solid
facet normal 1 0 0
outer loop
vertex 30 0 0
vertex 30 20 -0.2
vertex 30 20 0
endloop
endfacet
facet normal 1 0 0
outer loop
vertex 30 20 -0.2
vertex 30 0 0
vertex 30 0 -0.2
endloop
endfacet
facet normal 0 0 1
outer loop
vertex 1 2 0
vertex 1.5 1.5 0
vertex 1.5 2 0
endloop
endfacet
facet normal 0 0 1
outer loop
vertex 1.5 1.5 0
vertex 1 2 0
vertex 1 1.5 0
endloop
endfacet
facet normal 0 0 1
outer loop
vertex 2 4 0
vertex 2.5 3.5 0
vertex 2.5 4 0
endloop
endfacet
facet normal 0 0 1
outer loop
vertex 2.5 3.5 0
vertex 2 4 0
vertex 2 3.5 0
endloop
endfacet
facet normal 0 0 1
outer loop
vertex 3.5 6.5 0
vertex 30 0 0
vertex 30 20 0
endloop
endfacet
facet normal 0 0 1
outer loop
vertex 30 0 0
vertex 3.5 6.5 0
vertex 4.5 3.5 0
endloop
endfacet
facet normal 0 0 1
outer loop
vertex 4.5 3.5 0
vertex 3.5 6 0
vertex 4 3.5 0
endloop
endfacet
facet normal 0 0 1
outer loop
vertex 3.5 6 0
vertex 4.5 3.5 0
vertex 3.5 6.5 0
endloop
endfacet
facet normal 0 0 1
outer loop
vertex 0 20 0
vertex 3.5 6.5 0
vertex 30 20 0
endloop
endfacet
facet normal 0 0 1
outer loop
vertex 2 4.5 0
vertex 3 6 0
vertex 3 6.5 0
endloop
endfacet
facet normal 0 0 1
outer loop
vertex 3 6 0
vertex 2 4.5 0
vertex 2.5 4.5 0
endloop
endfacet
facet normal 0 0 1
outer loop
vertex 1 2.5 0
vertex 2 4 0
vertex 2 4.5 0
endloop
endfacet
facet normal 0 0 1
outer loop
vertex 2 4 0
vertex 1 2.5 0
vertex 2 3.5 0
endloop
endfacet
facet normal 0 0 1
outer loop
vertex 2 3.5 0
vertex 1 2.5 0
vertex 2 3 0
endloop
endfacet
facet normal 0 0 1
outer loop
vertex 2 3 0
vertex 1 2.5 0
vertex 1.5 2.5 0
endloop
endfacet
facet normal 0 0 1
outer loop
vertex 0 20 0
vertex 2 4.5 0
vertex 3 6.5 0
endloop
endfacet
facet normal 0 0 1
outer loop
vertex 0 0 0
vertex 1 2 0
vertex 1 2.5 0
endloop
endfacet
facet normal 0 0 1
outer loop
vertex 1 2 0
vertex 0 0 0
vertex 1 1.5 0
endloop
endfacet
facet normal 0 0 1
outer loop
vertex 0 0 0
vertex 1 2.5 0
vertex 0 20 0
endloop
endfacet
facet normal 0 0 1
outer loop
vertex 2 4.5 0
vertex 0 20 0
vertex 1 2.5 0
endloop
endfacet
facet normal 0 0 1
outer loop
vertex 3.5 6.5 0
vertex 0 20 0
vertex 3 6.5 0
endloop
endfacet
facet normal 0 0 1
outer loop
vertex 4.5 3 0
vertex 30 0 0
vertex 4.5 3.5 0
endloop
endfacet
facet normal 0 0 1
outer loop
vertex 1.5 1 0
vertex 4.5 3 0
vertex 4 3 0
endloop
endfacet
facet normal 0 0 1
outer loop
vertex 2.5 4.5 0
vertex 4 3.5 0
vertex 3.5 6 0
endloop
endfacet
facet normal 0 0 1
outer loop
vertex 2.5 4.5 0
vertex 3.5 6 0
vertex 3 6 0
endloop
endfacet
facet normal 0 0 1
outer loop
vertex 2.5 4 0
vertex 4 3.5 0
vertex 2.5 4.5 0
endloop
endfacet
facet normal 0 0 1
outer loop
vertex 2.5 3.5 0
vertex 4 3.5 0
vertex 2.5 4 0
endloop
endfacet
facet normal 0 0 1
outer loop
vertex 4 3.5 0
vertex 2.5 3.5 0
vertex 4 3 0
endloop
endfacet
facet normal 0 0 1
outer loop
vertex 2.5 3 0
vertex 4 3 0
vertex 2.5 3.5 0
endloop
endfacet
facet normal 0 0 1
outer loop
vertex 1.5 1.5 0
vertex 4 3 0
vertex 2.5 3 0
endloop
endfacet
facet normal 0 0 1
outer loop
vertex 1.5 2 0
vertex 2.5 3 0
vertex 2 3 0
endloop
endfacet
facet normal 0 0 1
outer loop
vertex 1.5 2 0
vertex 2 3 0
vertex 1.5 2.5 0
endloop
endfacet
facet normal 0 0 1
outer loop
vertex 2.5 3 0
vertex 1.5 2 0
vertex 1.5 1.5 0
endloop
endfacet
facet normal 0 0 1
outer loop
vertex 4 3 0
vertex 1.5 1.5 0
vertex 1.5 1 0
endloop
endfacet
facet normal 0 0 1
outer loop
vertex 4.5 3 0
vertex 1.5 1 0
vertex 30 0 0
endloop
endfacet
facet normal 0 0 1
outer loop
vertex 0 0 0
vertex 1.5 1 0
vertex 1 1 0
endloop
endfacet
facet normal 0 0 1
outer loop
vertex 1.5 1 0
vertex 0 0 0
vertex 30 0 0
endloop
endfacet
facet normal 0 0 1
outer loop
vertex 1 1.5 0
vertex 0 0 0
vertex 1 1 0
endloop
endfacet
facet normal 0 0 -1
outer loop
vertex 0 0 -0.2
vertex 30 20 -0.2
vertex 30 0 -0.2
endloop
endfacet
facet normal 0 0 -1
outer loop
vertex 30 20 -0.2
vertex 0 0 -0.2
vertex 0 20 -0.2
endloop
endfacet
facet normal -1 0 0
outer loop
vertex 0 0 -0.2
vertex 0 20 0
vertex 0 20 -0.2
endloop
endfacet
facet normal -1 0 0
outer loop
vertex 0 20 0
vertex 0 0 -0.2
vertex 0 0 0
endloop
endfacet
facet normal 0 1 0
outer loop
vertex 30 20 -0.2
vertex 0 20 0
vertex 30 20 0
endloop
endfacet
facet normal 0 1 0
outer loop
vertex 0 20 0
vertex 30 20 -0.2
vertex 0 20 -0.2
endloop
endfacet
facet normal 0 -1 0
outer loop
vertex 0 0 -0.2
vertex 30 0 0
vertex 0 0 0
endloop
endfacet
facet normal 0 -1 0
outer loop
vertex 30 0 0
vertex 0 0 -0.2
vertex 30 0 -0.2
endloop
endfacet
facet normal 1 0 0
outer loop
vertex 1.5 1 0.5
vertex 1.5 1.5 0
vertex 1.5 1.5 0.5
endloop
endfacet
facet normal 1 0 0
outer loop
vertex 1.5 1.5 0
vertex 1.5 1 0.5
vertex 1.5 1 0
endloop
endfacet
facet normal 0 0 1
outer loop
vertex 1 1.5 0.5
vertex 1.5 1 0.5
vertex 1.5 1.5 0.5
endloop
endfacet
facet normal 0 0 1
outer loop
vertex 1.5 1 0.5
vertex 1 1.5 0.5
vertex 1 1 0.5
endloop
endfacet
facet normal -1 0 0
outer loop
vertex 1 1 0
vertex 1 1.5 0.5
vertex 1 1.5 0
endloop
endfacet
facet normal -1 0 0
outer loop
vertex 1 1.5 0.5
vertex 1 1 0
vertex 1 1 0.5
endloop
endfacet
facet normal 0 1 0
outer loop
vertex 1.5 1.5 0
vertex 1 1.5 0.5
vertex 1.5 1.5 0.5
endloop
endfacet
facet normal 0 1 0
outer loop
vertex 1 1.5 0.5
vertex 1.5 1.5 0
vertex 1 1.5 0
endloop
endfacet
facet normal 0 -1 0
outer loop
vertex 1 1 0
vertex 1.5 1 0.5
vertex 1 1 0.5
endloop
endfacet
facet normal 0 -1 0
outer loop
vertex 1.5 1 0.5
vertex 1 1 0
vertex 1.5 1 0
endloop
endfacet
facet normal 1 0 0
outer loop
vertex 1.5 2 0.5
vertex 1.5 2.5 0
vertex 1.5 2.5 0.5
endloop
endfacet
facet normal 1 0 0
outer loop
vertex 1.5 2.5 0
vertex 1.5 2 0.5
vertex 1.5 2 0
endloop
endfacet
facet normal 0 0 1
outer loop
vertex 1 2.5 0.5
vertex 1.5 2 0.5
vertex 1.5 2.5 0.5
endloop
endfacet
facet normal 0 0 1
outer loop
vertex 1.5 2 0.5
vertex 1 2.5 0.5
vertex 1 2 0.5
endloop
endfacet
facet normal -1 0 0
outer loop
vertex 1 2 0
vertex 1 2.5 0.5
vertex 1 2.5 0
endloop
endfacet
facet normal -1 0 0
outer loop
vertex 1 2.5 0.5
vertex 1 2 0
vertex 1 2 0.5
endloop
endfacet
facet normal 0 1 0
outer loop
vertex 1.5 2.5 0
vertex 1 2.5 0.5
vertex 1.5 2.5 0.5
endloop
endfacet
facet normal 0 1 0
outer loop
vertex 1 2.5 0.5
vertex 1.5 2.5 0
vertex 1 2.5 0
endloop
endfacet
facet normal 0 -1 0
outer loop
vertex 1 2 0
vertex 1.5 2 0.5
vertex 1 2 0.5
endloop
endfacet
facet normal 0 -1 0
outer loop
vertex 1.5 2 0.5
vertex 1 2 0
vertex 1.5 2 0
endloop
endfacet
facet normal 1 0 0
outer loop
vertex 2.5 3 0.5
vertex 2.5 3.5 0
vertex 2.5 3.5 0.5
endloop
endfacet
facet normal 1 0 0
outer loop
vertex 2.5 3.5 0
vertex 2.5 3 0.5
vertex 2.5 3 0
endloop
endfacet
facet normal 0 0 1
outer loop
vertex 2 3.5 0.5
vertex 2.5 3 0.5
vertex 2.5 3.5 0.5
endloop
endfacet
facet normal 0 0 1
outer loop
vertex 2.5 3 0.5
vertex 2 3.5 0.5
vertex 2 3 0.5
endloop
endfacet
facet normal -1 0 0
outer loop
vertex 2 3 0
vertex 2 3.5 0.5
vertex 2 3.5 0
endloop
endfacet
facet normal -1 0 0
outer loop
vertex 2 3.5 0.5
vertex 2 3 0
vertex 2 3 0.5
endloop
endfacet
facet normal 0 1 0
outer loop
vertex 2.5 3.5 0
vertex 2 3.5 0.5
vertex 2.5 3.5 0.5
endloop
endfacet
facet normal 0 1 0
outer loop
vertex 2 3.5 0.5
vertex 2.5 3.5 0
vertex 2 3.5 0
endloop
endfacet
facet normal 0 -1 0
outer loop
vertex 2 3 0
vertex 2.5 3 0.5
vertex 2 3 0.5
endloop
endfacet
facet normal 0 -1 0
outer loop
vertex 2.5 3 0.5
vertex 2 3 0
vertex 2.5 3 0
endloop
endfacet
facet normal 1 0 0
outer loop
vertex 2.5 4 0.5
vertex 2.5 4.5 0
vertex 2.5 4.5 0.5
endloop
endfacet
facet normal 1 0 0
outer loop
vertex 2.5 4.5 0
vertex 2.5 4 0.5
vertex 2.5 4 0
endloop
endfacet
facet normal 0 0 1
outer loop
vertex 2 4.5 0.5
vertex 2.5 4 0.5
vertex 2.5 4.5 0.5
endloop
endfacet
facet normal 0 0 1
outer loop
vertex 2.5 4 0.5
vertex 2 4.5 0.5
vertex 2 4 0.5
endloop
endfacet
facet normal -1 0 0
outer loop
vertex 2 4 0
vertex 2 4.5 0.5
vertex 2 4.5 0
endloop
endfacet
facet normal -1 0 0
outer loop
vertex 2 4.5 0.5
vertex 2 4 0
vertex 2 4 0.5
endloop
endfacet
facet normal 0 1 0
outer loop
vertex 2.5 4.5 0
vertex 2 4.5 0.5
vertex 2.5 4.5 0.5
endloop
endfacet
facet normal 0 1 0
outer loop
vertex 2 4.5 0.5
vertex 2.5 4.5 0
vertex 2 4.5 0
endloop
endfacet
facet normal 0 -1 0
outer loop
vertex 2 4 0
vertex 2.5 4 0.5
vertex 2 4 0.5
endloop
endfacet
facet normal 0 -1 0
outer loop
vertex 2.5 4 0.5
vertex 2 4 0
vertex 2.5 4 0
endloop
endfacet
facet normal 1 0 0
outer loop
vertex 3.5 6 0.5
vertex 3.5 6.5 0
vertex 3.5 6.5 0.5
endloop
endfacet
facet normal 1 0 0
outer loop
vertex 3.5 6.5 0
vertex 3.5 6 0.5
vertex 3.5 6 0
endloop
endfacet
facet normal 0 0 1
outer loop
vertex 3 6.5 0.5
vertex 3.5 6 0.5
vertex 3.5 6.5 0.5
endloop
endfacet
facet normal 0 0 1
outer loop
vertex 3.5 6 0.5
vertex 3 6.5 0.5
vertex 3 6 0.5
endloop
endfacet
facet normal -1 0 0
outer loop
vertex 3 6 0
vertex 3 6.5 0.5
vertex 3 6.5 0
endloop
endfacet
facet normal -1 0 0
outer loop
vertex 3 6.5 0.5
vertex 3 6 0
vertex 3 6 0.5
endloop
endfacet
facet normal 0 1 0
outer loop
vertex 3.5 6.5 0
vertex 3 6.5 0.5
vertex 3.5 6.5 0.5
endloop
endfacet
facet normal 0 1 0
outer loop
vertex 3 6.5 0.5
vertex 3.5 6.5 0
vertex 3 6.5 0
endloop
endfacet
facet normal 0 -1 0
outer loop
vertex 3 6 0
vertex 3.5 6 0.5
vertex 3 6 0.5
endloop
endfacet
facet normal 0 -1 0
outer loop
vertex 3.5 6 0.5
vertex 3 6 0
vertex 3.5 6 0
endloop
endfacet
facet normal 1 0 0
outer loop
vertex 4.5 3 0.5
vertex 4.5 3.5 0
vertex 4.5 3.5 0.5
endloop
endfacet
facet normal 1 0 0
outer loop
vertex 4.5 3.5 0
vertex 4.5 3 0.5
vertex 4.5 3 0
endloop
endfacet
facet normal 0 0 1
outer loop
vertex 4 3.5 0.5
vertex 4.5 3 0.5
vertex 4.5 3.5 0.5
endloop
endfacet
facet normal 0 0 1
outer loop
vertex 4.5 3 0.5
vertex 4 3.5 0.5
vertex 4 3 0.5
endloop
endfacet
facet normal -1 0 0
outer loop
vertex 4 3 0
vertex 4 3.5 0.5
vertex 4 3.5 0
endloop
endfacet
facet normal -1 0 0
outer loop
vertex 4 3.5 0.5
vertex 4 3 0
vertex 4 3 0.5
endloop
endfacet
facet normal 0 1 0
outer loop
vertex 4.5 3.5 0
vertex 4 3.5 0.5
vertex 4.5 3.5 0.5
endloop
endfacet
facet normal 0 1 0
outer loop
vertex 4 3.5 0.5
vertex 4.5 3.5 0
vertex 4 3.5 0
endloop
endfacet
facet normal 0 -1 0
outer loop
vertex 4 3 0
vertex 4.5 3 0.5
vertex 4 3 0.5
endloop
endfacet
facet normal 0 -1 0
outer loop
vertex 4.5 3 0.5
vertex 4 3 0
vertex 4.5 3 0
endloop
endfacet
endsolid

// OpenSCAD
//Dimensions du tambour
tambour_length = 30;
tambour_width = 20;
tambour_thickness = 0.2;

//Ecartement des notes
note_tempo = 1;
note_spacing = 1;
note_startVOffset = 1;
note_startTOffset = 1;

//Dimensions cube note
note_width = 0.5;
note_length = 0.5;
note_height = 0.5;

//Tambour
color([1,0,0])
translate([0,0,-tambour_thickness]) 
cube([tambour_length,tambour_width,tambour_thickness]);

//Note
module drawNote(time,note) {
    translate([note_startTOffset+time*note_tempo,note_startVOffset+note*note_spacing,0]) 
    cube([note_length,note_width,note_height]);
}


//Placement des notes (temps, hauteur)
drawNote(0,0);
drawNote(0,1);
drawNote(1,2);
drawNote(1,3);
drawNote(2,5);
drawNote(3,2);
